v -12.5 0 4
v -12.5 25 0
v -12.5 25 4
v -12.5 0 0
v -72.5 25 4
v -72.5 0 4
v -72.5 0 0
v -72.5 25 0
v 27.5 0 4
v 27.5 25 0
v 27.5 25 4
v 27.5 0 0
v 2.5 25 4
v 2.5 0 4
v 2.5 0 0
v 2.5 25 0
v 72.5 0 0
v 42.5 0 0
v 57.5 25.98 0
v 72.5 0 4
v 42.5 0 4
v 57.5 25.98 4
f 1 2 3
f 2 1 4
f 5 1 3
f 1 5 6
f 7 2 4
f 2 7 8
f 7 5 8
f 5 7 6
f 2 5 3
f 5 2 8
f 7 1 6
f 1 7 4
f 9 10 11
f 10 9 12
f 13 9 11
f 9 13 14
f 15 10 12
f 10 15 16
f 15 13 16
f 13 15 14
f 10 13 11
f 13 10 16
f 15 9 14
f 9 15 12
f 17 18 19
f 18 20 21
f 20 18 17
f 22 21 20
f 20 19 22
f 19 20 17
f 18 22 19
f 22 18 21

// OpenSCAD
// Tinmans Tuning Guide, chapter 08: top-surface A/B.
// One set = a 60 x 25 mm block, a 25 mm square and a 30 mm triangle, all 4 mm tall. Tinman
// loads two sets: A (back row, rendered with row_y = 12.5) with Top surface pattern Monotonic
// Line, and B (front row, row_y = -37.5) with Monotonic, both as object settings, so the only
// difference between them is the top-surface path.
row_y = 0;   // set by -D on the command line
h = 4;
translate([0, row_y, 0]) {
  translate([-72.5, 0, 0]) cube([60, 25, h]);                      // block
  translate([2.5, 0, 0]) cube([25, 25, h]);                         // square
  translate([57.5, 0, 0]) linear_extrude(h) polygon([[-15, 0], [15, 0], [0, 25.98]]);  // triangle, apex at back
}
